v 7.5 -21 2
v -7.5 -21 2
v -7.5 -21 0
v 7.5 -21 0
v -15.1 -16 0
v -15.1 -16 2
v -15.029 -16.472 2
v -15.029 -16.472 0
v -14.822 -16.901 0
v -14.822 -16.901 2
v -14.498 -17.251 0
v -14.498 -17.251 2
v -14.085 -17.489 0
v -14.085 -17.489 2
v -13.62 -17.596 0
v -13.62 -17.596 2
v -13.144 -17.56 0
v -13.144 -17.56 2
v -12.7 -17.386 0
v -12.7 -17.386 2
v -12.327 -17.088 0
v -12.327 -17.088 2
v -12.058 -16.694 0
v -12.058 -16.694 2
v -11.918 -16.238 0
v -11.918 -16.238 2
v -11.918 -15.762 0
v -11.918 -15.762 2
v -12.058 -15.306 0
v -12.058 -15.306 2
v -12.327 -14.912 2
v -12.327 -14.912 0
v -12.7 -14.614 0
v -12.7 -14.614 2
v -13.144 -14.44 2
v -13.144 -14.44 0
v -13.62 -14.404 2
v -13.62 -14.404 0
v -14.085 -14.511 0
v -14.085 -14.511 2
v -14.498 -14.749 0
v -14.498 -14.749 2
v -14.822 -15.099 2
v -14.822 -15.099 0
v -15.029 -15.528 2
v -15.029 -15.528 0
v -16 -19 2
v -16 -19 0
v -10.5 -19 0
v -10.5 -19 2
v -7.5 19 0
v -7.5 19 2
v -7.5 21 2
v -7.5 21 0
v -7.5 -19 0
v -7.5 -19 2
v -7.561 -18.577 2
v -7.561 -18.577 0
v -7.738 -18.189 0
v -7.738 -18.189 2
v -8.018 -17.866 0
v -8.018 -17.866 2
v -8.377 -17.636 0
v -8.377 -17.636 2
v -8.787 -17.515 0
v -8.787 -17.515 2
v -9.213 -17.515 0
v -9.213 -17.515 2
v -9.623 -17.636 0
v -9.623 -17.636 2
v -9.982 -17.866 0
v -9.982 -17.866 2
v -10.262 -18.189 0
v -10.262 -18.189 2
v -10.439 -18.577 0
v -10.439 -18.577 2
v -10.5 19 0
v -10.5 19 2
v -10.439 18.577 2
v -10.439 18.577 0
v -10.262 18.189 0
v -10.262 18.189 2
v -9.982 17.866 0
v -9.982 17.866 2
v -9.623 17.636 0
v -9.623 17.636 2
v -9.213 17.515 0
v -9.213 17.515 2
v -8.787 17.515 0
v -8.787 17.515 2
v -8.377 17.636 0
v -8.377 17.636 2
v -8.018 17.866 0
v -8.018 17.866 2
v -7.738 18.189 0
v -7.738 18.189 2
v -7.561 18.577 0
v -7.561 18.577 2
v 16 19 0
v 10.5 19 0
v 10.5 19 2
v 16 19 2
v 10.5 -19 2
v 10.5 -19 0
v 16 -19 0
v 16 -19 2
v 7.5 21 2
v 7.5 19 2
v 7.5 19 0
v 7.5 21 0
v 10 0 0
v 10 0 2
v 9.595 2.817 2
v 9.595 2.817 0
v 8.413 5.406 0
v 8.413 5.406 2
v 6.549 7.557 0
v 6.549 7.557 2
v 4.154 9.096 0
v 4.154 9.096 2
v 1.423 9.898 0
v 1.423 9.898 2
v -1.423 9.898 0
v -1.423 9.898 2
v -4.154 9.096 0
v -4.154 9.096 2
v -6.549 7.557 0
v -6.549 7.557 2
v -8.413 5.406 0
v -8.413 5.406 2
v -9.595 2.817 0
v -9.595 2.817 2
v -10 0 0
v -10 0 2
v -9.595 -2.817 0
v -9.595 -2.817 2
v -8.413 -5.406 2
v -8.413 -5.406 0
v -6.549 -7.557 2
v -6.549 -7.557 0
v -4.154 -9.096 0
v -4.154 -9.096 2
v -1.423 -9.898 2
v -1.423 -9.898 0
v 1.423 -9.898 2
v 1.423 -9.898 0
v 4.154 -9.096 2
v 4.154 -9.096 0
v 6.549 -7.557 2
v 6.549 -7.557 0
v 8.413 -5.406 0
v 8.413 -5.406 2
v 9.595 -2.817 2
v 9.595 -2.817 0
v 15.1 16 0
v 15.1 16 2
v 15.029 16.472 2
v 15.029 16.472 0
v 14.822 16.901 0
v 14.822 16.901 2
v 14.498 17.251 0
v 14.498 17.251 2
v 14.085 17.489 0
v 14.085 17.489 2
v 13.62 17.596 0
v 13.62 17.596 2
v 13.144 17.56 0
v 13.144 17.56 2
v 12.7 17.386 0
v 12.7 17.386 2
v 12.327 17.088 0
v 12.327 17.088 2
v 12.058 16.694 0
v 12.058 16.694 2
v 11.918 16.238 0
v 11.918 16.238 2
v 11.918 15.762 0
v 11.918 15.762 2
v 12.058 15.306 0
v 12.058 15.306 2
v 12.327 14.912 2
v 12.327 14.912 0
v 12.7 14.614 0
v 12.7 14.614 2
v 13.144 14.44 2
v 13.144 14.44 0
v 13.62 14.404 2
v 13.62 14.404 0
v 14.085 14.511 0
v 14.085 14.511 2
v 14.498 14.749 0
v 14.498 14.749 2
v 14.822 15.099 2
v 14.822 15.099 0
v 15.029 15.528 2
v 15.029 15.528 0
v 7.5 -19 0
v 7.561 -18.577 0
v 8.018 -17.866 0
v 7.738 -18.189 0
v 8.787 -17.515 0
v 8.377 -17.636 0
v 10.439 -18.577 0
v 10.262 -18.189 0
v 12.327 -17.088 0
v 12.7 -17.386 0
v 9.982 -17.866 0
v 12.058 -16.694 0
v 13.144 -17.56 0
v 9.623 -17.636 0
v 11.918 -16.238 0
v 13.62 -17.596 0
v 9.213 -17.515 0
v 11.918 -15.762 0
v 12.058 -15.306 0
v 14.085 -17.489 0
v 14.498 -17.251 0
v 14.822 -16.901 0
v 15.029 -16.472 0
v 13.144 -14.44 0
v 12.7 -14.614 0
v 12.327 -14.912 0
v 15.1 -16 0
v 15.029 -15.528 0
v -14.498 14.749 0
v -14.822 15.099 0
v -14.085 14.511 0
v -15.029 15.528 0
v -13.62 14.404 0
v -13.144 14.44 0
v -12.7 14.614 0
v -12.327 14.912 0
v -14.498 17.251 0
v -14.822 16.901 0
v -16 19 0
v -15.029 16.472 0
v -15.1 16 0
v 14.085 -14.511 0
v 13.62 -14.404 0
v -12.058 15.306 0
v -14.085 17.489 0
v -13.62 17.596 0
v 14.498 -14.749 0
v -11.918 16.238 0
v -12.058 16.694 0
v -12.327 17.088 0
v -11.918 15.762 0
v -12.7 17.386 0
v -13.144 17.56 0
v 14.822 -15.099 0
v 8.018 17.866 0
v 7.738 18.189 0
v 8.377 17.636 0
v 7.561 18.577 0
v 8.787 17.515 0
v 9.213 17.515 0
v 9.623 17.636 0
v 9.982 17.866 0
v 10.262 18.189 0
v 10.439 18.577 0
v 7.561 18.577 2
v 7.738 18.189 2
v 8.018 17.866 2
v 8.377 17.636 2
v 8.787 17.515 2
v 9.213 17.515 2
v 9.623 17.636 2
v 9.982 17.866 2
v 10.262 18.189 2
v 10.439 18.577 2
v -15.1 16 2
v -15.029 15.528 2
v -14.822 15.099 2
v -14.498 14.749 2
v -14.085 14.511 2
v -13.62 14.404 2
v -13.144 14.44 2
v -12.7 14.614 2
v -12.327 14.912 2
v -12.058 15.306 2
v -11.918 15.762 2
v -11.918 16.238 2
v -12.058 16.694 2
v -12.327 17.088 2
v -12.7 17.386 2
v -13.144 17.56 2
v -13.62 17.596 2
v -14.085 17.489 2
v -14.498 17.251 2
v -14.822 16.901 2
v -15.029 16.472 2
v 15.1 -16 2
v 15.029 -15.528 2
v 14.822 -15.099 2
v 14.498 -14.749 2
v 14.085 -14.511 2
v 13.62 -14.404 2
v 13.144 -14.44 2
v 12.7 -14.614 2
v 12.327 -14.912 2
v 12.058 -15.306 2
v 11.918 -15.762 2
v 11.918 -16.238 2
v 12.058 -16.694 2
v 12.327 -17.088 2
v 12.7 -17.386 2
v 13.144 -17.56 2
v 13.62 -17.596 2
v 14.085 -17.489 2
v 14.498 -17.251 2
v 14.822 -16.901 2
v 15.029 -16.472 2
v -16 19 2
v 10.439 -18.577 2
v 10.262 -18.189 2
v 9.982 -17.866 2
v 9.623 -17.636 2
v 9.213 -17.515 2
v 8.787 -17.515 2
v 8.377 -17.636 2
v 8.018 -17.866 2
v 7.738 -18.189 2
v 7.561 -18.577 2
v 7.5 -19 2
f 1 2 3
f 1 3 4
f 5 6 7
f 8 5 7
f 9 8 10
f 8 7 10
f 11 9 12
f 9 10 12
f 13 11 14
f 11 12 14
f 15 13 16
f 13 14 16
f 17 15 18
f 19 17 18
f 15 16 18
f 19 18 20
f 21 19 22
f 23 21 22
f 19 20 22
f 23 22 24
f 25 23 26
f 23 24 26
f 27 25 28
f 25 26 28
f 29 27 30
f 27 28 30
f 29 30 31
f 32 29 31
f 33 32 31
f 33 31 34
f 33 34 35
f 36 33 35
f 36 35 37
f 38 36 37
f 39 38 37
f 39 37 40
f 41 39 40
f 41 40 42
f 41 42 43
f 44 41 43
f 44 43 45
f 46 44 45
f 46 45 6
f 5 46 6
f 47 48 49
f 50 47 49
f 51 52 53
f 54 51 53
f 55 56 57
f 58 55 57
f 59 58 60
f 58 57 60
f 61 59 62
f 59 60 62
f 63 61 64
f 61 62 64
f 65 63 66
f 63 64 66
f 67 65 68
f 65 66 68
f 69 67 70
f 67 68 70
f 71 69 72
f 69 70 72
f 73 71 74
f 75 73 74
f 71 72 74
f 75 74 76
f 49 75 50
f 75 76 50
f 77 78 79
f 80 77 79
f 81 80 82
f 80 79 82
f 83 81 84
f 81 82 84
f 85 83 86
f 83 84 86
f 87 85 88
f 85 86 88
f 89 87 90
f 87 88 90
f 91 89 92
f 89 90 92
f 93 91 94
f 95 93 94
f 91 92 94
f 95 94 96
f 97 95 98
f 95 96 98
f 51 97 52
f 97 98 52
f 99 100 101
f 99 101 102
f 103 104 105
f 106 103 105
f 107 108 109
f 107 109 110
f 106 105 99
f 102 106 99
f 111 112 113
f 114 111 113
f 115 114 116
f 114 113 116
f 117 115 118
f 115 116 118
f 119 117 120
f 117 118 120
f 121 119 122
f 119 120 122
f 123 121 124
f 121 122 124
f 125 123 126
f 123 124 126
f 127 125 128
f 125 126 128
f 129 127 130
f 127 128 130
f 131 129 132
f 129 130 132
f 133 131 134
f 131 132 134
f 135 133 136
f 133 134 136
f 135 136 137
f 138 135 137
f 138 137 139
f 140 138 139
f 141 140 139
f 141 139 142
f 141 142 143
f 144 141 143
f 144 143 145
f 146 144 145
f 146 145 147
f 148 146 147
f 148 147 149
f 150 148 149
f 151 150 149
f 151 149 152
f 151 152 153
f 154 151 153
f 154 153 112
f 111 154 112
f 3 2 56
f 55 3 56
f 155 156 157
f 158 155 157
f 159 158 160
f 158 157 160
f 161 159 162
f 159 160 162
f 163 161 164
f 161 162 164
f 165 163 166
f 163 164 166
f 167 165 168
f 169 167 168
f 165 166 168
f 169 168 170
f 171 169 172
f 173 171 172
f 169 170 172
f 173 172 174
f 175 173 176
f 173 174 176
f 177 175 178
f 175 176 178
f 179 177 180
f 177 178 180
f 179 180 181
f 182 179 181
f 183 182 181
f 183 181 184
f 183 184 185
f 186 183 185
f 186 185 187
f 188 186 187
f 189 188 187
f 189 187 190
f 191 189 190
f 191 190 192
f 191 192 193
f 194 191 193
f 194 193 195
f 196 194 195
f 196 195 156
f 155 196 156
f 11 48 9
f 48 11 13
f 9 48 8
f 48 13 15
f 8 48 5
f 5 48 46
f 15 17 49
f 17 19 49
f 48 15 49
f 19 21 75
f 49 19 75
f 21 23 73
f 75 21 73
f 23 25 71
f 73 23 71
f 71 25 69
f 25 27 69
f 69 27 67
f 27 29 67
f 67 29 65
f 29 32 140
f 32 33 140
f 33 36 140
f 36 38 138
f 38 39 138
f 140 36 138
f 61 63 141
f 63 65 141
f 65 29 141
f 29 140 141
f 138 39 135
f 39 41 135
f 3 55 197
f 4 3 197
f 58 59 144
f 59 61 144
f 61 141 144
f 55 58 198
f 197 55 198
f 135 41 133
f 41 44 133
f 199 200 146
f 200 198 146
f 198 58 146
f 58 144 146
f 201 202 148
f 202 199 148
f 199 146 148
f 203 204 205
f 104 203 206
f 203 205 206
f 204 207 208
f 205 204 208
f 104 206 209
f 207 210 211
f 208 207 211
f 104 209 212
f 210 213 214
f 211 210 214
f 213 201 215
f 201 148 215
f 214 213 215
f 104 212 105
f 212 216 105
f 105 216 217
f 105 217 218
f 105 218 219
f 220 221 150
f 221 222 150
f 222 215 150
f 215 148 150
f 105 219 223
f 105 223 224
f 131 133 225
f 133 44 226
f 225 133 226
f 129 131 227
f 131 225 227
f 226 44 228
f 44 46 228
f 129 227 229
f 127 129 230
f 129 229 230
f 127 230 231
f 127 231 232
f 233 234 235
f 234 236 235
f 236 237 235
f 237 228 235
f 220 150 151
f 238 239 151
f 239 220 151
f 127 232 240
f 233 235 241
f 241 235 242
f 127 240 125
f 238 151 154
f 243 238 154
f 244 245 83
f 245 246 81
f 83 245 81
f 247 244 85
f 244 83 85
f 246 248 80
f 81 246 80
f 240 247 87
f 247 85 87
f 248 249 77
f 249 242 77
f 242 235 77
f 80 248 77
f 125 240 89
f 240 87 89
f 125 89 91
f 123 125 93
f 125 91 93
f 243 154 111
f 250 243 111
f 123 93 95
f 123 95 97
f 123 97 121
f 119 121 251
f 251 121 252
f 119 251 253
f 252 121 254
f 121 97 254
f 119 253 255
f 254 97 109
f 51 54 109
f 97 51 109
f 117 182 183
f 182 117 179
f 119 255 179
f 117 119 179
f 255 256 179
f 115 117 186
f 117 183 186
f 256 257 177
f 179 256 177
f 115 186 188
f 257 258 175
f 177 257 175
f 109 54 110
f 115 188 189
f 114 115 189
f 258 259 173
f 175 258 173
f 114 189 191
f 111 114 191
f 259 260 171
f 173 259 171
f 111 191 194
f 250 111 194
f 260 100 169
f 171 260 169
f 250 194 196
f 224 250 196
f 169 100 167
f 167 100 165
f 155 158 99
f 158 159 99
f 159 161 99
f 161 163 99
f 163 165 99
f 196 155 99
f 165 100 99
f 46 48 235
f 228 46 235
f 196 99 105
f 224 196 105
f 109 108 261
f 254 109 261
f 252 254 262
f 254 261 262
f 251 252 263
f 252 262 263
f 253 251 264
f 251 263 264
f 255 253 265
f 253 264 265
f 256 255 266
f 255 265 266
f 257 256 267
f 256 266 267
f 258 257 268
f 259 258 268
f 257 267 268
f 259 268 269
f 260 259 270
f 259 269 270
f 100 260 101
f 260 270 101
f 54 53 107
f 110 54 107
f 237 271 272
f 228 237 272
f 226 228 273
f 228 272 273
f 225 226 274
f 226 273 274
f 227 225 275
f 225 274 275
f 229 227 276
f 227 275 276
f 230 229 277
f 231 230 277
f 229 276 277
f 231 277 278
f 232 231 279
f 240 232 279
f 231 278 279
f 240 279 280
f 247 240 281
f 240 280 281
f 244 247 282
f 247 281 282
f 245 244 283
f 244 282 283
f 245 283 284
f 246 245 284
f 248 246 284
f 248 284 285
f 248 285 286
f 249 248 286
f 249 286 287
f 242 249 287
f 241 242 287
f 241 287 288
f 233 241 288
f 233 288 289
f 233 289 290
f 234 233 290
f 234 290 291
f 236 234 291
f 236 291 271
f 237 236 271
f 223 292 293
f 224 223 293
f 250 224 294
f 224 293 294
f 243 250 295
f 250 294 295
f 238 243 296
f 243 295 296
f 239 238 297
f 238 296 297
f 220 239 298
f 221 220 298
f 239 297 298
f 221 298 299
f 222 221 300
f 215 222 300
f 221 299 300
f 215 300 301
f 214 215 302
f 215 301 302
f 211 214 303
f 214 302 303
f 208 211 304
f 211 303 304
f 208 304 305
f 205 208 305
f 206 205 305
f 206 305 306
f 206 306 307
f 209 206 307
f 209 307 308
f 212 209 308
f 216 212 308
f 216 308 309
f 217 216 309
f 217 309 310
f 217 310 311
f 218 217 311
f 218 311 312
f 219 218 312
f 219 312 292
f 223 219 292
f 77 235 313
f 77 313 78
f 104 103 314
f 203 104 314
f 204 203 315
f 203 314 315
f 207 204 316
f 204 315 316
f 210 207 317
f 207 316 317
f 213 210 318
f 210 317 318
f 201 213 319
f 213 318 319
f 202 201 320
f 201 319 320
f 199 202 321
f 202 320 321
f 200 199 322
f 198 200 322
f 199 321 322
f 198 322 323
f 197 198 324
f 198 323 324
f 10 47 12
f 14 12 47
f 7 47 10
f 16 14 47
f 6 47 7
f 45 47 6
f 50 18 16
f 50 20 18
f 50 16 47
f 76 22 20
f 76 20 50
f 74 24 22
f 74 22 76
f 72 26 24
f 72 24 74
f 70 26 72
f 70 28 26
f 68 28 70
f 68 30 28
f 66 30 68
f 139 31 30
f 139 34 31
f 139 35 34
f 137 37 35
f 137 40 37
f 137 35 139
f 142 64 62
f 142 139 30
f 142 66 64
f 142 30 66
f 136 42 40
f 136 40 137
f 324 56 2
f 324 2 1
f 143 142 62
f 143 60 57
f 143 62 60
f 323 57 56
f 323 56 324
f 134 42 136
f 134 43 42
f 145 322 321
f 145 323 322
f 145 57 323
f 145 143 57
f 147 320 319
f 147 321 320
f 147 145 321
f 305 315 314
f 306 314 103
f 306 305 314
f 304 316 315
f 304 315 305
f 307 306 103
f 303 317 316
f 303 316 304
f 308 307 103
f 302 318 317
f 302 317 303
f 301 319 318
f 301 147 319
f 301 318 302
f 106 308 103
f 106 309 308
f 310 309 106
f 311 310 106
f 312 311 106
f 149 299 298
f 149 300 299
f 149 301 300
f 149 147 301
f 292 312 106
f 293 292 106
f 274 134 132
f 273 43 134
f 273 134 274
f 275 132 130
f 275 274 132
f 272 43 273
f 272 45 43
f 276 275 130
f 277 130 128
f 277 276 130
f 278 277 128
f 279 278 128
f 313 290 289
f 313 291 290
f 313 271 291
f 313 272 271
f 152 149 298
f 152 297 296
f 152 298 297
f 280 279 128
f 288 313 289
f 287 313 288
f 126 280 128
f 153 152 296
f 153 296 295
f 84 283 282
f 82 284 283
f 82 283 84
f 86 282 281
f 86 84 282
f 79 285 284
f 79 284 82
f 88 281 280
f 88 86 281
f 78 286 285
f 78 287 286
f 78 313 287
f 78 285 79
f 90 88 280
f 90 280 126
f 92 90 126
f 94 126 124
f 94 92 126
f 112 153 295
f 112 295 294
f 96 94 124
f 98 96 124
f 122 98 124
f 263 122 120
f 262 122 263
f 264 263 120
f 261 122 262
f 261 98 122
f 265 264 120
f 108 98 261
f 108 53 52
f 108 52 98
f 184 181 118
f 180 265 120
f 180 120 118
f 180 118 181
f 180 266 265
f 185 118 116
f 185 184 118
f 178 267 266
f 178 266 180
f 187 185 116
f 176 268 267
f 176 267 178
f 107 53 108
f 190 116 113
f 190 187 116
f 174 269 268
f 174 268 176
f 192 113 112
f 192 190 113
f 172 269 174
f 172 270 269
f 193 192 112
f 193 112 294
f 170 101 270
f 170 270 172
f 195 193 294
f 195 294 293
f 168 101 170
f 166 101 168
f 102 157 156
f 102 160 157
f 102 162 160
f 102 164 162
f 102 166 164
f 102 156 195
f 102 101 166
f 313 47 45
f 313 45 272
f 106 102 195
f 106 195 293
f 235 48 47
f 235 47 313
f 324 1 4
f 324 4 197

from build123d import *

# Parameters (mm, degrees)
SKETCH_1_W          = 32
SKETCH_1_H          = 38
EXTRUDE_1_DEPTH     = 2
SKETCH_2_R          = 10
CUT_EXTRUDE_1_DEPTH = 3
SKETCH_3_W          = 15
SKETCH_3_H          = 2
EXTRUDE_2_DEPTH     = 2
SKETCH_4_R          = 1.5
CUT_EXTRUDE_2_DEPTH = 3
SKETCH_5_R          = 1.6
CUT_EXTRUDE_3_DEPTH = 27.47640459


with BuildPart() as part:
    # 草图1 → 凸台-拉伸1 (new body)
    with BuildSketch(Plane.XY):
        Rectangle(SKETCH_1_W, SKETCH_1_H)
    extrude(amount=EXTRUDE_1_DEPTH)

    # 草图2 → 切除-拉伸1 (cut)
    with BuildSketch(Plane.XY.offset(2)):
        Circle(SKETCH_2_R)
    extrude(amount=-CUT_EXTRUDE_1_DEPTH, mode=Mode.SUBTRACT)

    # 草图3 → 凸台-拉伸2 (add)
    with BuildSketch(Plane.XY.offset(2)):
        with Locations((0, 20)):
            Rectangle(SKETCH_3_W, SKETCH_3_H)
        with Locations((0, -20)):
            Rectangle(SKETCH_3_W, SKETCH_3_H)
    extrude(amount=-EXTRUDE_2_DEPTH)

    # 草图4 → 切除-拉伸2 (cut)
    with BuildSketch(Plane.XY.offset(2)):
        with Locations((-9, 19)):
            Circle(SKETCH_4_R)
        with Locations((-9, -19)):
            Circle(SKETCH_4_R)
        with Locations((9, 19)):
            Circle(SKETCH_4_R)
        with Locations((9, -19)):
            Circle(SKETCH_4_R)
    extrude(amount=-CUT_EXTRUDE_2_DEPTH, mode=Mode.SUBTRACT)

    # 草图5 → 切除-拉伸3 (cut, through all)
    with BuildSketch(Plane.XY.offset(2)):
        with Locations((13.5, 16)):
            Circle(SKETCH_5_R)
        with Locations((13.5, -16)):
            Circle(SKETCH_5_R)
        with Locations(Location((-13.5, -16, 0), (0, 0, 180))):
            Circle(SKETCH_5_R)
        with Locations(Location((-13.5, 16, 0), (0, 0, 180))):
            Circle(SKETCH_5_R)
    extrude(amount=-CUT_EXTRUDE_3_DEPTH, mode=Mode.SUBTRACT)


solid = part.part
